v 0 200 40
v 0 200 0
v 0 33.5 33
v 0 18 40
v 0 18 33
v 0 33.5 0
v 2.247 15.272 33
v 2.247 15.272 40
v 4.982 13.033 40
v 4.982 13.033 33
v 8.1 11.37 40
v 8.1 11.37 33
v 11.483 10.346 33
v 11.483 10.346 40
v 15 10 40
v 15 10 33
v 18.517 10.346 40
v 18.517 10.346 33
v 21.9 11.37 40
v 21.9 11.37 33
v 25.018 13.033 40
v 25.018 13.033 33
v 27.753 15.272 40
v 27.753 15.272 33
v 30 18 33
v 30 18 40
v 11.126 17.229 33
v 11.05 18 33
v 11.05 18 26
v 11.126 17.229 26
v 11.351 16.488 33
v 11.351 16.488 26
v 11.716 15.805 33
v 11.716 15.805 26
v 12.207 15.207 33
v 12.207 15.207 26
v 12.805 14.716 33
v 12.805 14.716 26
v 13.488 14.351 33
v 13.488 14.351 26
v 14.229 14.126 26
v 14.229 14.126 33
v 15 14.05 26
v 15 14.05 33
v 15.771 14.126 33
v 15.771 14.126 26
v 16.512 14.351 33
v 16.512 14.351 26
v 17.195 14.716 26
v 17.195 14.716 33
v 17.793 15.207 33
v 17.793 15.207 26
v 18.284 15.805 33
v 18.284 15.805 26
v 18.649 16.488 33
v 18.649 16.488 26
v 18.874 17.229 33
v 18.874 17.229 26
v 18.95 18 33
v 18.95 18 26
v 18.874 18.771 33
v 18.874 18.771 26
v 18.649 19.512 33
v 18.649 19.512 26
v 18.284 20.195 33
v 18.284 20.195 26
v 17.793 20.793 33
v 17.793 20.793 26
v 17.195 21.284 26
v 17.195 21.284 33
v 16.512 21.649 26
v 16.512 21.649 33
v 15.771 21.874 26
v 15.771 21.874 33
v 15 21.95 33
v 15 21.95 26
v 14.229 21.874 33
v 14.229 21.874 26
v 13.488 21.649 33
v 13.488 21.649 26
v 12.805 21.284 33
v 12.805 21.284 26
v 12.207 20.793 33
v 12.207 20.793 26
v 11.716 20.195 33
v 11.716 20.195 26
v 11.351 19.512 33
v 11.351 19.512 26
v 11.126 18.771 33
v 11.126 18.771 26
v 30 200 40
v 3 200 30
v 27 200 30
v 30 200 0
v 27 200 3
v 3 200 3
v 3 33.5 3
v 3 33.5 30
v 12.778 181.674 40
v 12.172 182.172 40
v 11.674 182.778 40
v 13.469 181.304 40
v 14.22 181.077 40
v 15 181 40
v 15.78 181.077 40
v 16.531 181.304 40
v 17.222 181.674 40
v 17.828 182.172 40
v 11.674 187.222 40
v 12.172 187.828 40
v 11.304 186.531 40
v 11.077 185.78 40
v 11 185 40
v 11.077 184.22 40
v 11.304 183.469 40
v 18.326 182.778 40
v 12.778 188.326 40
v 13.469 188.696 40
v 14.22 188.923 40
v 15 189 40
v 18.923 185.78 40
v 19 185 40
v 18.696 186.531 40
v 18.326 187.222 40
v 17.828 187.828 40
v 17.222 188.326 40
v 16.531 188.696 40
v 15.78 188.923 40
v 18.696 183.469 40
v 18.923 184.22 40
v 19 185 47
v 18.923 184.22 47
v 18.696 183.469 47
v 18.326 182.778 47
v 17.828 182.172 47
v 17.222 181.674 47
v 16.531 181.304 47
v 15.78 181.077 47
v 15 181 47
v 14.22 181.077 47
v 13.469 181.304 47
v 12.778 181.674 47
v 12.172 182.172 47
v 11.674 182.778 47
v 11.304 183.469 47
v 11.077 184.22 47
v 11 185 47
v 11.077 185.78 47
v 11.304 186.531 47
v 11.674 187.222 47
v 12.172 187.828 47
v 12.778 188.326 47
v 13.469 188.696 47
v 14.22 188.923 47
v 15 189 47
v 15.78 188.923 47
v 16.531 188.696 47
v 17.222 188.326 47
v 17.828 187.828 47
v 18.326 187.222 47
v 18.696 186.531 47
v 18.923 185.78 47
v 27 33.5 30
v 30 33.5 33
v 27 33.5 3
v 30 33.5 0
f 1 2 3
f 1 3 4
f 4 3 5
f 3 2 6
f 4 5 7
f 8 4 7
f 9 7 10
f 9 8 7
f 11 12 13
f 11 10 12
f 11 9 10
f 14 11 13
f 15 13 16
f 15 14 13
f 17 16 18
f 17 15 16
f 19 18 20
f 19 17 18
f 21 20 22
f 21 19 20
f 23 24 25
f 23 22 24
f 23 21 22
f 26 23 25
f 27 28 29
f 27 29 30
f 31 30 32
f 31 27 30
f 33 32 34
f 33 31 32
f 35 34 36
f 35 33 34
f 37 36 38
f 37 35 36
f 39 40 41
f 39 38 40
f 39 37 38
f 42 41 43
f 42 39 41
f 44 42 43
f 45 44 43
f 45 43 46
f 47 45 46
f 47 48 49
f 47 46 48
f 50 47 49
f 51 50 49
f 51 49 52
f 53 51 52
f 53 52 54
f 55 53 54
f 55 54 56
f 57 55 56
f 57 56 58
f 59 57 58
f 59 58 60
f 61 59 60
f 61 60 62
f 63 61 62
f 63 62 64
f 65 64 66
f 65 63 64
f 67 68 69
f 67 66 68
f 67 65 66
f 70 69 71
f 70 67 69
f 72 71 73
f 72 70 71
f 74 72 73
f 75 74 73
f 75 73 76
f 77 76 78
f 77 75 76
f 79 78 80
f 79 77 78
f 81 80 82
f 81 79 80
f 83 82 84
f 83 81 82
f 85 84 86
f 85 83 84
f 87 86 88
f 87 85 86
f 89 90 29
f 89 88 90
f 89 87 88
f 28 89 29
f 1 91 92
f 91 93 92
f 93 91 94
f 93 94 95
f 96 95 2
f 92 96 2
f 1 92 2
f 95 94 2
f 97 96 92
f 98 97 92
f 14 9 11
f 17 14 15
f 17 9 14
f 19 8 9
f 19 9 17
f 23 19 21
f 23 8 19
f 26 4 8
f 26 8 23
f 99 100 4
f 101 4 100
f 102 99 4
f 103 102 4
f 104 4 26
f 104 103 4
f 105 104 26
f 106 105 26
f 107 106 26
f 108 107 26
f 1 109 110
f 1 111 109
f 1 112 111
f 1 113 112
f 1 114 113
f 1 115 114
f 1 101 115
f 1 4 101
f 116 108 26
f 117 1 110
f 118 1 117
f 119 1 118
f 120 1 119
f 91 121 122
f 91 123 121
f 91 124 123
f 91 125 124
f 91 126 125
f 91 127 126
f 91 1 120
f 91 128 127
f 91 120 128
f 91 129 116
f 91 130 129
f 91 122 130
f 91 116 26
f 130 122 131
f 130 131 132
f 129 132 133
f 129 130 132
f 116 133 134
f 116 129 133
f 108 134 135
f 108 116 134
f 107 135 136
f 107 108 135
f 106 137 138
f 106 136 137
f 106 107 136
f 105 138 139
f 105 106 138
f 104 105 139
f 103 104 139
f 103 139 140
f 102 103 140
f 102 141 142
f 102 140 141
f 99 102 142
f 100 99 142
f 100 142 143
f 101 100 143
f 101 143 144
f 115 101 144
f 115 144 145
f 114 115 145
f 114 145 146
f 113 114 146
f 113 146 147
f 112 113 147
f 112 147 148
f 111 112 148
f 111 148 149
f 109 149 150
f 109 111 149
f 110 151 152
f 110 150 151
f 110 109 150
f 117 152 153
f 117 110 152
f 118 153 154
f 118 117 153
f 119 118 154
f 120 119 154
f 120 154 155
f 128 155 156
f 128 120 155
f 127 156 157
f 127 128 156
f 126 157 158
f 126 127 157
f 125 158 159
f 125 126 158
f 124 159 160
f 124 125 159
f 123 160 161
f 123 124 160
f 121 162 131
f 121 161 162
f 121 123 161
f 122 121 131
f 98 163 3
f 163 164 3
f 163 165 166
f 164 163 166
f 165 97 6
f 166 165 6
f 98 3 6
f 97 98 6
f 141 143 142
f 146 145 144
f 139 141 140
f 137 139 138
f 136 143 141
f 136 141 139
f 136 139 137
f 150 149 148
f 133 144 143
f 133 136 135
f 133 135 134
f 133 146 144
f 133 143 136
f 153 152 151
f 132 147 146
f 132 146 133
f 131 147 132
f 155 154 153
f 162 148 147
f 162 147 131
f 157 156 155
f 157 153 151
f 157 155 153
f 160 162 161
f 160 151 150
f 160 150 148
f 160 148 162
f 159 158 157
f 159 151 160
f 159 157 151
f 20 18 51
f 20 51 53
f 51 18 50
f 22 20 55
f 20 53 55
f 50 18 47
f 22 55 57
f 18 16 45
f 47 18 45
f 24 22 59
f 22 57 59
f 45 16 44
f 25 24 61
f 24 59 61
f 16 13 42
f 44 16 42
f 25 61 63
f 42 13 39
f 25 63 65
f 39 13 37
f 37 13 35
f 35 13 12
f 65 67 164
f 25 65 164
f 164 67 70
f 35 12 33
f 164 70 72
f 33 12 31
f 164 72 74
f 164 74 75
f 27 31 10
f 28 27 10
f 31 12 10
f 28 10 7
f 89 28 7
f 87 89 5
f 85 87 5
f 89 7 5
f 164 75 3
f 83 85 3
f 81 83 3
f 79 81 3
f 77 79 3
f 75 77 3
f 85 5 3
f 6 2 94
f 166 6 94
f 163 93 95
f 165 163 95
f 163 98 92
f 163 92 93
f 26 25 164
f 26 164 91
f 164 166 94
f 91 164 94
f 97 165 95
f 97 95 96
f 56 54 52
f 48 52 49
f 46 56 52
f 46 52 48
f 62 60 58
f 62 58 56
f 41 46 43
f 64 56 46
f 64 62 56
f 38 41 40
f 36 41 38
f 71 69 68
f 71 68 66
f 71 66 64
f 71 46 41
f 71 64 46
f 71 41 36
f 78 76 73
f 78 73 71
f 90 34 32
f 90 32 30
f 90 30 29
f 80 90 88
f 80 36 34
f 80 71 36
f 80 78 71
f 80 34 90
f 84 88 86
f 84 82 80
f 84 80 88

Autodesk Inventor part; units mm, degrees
ref_plane "YZ Plane" through (0, 0, 0) normal (1, 0, 0) x (0, 1, 0)
ref_plane "XZ Plane" through (0, 0, 0) normal (0, 1, 0) x (-1, 0, 0)
ref_plane "XY Plane" through (0, 0, 0) normal (0, 0, 1) x (1, 0, 0)
sketch "Sketch1" plane through (0, 0, 0) normal (0, 0, 1) x (1, 0, 0)
  line L0 (0, 0) -> (30, 0)
  line L1 (30, 0) -> (30, 200)
  line L2 (30, 200) -> (0, 200)
  line L3 (0, 200) -> (0, 0)
  dimension "d0" = 30
  dimension "d1" = 200
extrude "Extrusion1" add sketch "Sketch1" along normal blind 40
sketch "Sketch2" plane through (0, 0, 0) normal (-1, 0, 0) x (0, 0, 1)
  line L0 (0, 0) -> (33, 0)
  line L1 (33, 0) -> (33, 33.5)
  line L2 (33, 33.5) -> (0, 33.5)
  line L3 (0, 33.5) -> (0, 0)
  dimension "d4" = 33
  dimension "d5" = 33.5
extrude "Extrusion2" cut sketch "Sketch2" against normal up to surface (30 mm away)
sketch "Sketch3" plane through (0, 0, 33) normal (0, 0, -1) x (-1, 0, 0)
  circle A0 centre (-15, 18) radius 3.95
  line L0 (0, 0) -> (-30, 0) projected
  line L1 (0, 33.5) -> (0, 0) projected
  dimension "d8" = 7.9
  dimension "d9" = 18
  dimension "d10" = 15
extrude "Extrusion3" add sketch "Sketch3" along normal blind 7
sketch "Sketch5" plane through (0, 0, 40) normal (0, 0, 1) x (1, 0, 0)
  line L0 (0, 33.5) -> (0, 0) projected
  line L1 (30, 0) -> (30, 200) projected
  line L2 (0, 0) -> (30, 0)
  line L3 (30, 0) -> (30, 10)
  line L4 (30, 10) -> (0, 10)
  line L5 (0, 10) -> (0, 0)
  dimension "d16" = 10
extrude "Extrusion5" cut sketch "Sketch5" against normal up to surface (7 mm away)
sketch "Sketch7" plane through (0, 0, 40) normal (0, 0, 1) x (1, 0, 0)
  circle A0 centre (15, 185) radius 4
  line L0 (30, 200) -> (0, 200) projected
  line L1 (30, 10) -> (30, 200) projected
  point P0 (0, 0)
  dimension "d19" = 8
  dimension "d22" = 15
  dimension "d23" = 15
extrude "Extrusion6" add sketch "Sketch7" along normal blind 7
sketch "Sketch8" plane through (0, 33.5, 0) normal (0, -1, 0) x (1, 0, 0)
  line L0 (30, 33) -> (30, 0) projected
  line L1 (0, 33) -> (30, 33) projected
  line L2 (0, 0) -> (0, 33) projected
  line L3 (30, 0) -> (0, 0) projected
  line L4 (3, 30) -> (27, 30)
  line L5 (27, 30) -> (27, 3)
  line L6 (27, 3) -> (3, 3)
  line L7 (3, 3) -> (3, 30)
  point P0 (0, 0)
  dimension "d24" = 3
extrude "Extrusion7" cut sketch "Sketch8" against normal up to surface (166.5 mm away) contours L4 L5 L6 L7
sketch "Sketch9" plane through (0, 0, 40) normal (0, 0, 1) x (1, 0, 0)
  circle A0 centre (15, 18) radius 3.95 projected
  line L0 (0, 200) -> (0, 10) projected
  line L1 (30, 10) -> (30, 33.5) projected
  arc A1 (0, 18) -> (30, 18) centre (15, 28.0625) ccw
  line L2 (30, 10) -> (0, 10) projected
  line L3 (0, 18) -> (0, 10)
  line L4 (0, 10) -> (30, 10)
  line L5 (30, 18) -> (30, 10)
  line L6 (15, 18) -> (15, 28.0625) construction
  point P0 (0, 0)
  point P1 (15, 10)
  dimension "d27" = 8
extrude "Extrusion8" cut sketch "Sketch9" against normal up to surface (7 mm away) contours A1 L2 L0 | A1 L1 L2
properties part number "arm1"
